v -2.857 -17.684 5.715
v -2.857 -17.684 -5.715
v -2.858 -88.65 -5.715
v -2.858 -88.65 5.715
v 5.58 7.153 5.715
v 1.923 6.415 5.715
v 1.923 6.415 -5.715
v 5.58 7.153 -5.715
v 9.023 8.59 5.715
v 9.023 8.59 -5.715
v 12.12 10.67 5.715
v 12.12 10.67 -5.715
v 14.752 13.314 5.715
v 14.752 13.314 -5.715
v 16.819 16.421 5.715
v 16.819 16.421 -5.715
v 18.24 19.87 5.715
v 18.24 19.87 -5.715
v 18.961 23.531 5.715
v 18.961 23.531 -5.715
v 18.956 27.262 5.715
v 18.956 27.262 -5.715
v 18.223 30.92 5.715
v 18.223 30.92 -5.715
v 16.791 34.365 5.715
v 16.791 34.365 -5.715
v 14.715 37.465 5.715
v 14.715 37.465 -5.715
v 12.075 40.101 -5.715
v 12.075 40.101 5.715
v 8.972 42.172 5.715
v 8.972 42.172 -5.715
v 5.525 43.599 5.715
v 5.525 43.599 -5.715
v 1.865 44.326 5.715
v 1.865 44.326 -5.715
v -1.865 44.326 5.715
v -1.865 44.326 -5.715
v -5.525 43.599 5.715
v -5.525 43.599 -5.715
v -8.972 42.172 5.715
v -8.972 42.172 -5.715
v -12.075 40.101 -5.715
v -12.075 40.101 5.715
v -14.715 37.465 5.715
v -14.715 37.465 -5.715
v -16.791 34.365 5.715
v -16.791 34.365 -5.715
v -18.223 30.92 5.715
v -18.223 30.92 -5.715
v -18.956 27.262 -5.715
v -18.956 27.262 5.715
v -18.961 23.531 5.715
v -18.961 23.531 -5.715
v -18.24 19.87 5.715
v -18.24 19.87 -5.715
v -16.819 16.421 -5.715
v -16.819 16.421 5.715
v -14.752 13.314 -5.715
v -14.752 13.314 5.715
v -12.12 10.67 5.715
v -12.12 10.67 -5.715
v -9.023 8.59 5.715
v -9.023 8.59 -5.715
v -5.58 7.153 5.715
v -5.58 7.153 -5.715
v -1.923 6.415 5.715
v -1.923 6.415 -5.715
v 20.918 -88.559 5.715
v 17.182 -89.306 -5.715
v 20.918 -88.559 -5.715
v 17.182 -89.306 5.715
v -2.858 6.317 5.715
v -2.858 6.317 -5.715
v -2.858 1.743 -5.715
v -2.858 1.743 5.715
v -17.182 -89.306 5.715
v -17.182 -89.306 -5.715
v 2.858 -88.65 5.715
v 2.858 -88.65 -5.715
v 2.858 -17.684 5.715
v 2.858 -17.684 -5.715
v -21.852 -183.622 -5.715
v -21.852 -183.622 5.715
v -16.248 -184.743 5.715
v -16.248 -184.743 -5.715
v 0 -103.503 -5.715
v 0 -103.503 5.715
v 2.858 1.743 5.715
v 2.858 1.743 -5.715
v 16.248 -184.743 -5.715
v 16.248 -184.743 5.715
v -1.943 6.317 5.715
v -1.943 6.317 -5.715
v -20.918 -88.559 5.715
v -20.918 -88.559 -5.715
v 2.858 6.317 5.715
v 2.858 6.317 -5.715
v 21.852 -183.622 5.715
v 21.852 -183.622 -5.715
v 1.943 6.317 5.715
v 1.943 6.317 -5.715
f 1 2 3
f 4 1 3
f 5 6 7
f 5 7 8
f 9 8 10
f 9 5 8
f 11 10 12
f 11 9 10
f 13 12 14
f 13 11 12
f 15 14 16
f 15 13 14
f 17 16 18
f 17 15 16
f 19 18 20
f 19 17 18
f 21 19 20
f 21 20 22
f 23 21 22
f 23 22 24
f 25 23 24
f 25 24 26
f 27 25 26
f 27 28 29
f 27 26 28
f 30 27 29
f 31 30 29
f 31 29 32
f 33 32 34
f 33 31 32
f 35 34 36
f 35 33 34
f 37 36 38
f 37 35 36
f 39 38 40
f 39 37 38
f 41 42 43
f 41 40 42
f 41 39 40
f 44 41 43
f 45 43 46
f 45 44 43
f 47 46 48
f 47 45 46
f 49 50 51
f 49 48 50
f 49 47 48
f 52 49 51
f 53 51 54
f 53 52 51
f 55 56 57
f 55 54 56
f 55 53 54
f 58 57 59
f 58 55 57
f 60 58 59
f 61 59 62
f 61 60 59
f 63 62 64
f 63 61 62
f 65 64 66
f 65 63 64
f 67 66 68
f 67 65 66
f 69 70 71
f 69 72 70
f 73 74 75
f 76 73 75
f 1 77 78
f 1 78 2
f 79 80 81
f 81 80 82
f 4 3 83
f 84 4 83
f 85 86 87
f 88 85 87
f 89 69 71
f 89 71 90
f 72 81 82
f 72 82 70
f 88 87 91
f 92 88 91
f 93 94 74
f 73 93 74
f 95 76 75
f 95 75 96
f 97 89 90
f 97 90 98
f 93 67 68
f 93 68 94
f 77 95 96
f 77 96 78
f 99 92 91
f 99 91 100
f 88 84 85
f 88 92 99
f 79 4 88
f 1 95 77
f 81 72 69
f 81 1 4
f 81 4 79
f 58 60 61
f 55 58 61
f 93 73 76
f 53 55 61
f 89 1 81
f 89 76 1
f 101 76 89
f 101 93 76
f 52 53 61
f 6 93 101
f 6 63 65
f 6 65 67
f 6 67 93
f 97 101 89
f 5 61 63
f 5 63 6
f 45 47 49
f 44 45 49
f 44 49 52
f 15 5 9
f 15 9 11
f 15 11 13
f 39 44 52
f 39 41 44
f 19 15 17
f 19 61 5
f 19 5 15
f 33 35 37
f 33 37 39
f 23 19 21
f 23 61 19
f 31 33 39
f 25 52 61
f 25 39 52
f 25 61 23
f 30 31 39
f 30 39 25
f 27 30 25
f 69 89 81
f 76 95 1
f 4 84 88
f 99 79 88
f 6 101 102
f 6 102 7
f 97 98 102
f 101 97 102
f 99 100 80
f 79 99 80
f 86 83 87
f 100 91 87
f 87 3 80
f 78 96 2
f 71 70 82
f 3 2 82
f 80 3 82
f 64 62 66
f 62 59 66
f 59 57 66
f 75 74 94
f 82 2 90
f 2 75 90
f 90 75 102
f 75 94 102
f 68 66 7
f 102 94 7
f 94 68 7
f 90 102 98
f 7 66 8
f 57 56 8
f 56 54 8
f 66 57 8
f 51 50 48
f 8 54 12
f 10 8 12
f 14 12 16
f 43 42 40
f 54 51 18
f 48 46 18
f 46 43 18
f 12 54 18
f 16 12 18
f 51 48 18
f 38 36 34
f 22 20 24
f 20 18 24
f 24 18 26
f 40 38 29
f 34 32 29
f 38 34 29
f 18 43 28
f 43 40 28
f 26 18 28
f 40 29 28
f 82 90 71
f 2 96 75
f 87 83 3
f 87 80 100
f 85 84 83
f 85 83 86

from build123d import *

# Parameters (mm, degrees)
SKETCH1_R           = 12.7
BOSS_EXTRUDE1_DEPTH = 3.81
EXTRUDE_THIN1_START = -3.81
EXTRUDE_THIN1_DEPTH = 7.62
EXTRUDE_THIN4_DEPTH = 3.81
SCALE1_SCALE        = 1.5


# Read off the part's stored shape, not the designer's step: Extrude-Thin1
with BuildPart() as part:
    # Sketch1 → Boss-Extrude1 (new, symmetric)
    with BuildSketch(Plane.XY):
        with Locations(Location((0, 0, 0), (0, 0, 180))):
            Circle(SKETCH1_R)
    extrude(amount=BOSS_EXTRUDE1_DEPTH, both=True)



with BuildPart() as body_2:
    # Extrude-Thin1 outline → Extrude-Thin1 (new body)
    with BuildSketch(Plane.XY.offset(EXTRUDE_THIN1_START)):
        Polygon((14.568006187, -139.326398763), (1.905, -76.011367827), (1.905, -12.7), (-1.905, -12.7), (-1.905, -76.011367827), (-14.568006187, -139.326398763), (-10.831993813, -140.073601237), (0, -85.913632173), (10.831993813, -140.073601237), align=None)
    extrude(amount=EXTRUDE_THIN1_DEPTH)


with BuildPart() as part_1:
    add(part.part)

    add(body_2.part)  # Extrude-Thin4 merges body 2
    # Sketch1<4> → Extrude-Thin4 (add, symmetric)
    with BuildSketch(Plane.XY):
        Polygon((13.945337458, -75.950932508), (0, -6.224245218), (-13.945337458, -75.950932508), (-11.454662542, -76.449067492), (0, -19.175754782), (11.454662542, -76.449067492), align=None)
    extrude(amount=EXTRUDE_THIN4_DEPTH, both=True)


with BuildPart() as part_2:
    # Scale1: scaled about (0, -50.73447441, 0)
    add(part_1.part.scale(SCALE1_SCALE).moved(Location((0, 25.367237205, 0))))


solid = part_2.part
